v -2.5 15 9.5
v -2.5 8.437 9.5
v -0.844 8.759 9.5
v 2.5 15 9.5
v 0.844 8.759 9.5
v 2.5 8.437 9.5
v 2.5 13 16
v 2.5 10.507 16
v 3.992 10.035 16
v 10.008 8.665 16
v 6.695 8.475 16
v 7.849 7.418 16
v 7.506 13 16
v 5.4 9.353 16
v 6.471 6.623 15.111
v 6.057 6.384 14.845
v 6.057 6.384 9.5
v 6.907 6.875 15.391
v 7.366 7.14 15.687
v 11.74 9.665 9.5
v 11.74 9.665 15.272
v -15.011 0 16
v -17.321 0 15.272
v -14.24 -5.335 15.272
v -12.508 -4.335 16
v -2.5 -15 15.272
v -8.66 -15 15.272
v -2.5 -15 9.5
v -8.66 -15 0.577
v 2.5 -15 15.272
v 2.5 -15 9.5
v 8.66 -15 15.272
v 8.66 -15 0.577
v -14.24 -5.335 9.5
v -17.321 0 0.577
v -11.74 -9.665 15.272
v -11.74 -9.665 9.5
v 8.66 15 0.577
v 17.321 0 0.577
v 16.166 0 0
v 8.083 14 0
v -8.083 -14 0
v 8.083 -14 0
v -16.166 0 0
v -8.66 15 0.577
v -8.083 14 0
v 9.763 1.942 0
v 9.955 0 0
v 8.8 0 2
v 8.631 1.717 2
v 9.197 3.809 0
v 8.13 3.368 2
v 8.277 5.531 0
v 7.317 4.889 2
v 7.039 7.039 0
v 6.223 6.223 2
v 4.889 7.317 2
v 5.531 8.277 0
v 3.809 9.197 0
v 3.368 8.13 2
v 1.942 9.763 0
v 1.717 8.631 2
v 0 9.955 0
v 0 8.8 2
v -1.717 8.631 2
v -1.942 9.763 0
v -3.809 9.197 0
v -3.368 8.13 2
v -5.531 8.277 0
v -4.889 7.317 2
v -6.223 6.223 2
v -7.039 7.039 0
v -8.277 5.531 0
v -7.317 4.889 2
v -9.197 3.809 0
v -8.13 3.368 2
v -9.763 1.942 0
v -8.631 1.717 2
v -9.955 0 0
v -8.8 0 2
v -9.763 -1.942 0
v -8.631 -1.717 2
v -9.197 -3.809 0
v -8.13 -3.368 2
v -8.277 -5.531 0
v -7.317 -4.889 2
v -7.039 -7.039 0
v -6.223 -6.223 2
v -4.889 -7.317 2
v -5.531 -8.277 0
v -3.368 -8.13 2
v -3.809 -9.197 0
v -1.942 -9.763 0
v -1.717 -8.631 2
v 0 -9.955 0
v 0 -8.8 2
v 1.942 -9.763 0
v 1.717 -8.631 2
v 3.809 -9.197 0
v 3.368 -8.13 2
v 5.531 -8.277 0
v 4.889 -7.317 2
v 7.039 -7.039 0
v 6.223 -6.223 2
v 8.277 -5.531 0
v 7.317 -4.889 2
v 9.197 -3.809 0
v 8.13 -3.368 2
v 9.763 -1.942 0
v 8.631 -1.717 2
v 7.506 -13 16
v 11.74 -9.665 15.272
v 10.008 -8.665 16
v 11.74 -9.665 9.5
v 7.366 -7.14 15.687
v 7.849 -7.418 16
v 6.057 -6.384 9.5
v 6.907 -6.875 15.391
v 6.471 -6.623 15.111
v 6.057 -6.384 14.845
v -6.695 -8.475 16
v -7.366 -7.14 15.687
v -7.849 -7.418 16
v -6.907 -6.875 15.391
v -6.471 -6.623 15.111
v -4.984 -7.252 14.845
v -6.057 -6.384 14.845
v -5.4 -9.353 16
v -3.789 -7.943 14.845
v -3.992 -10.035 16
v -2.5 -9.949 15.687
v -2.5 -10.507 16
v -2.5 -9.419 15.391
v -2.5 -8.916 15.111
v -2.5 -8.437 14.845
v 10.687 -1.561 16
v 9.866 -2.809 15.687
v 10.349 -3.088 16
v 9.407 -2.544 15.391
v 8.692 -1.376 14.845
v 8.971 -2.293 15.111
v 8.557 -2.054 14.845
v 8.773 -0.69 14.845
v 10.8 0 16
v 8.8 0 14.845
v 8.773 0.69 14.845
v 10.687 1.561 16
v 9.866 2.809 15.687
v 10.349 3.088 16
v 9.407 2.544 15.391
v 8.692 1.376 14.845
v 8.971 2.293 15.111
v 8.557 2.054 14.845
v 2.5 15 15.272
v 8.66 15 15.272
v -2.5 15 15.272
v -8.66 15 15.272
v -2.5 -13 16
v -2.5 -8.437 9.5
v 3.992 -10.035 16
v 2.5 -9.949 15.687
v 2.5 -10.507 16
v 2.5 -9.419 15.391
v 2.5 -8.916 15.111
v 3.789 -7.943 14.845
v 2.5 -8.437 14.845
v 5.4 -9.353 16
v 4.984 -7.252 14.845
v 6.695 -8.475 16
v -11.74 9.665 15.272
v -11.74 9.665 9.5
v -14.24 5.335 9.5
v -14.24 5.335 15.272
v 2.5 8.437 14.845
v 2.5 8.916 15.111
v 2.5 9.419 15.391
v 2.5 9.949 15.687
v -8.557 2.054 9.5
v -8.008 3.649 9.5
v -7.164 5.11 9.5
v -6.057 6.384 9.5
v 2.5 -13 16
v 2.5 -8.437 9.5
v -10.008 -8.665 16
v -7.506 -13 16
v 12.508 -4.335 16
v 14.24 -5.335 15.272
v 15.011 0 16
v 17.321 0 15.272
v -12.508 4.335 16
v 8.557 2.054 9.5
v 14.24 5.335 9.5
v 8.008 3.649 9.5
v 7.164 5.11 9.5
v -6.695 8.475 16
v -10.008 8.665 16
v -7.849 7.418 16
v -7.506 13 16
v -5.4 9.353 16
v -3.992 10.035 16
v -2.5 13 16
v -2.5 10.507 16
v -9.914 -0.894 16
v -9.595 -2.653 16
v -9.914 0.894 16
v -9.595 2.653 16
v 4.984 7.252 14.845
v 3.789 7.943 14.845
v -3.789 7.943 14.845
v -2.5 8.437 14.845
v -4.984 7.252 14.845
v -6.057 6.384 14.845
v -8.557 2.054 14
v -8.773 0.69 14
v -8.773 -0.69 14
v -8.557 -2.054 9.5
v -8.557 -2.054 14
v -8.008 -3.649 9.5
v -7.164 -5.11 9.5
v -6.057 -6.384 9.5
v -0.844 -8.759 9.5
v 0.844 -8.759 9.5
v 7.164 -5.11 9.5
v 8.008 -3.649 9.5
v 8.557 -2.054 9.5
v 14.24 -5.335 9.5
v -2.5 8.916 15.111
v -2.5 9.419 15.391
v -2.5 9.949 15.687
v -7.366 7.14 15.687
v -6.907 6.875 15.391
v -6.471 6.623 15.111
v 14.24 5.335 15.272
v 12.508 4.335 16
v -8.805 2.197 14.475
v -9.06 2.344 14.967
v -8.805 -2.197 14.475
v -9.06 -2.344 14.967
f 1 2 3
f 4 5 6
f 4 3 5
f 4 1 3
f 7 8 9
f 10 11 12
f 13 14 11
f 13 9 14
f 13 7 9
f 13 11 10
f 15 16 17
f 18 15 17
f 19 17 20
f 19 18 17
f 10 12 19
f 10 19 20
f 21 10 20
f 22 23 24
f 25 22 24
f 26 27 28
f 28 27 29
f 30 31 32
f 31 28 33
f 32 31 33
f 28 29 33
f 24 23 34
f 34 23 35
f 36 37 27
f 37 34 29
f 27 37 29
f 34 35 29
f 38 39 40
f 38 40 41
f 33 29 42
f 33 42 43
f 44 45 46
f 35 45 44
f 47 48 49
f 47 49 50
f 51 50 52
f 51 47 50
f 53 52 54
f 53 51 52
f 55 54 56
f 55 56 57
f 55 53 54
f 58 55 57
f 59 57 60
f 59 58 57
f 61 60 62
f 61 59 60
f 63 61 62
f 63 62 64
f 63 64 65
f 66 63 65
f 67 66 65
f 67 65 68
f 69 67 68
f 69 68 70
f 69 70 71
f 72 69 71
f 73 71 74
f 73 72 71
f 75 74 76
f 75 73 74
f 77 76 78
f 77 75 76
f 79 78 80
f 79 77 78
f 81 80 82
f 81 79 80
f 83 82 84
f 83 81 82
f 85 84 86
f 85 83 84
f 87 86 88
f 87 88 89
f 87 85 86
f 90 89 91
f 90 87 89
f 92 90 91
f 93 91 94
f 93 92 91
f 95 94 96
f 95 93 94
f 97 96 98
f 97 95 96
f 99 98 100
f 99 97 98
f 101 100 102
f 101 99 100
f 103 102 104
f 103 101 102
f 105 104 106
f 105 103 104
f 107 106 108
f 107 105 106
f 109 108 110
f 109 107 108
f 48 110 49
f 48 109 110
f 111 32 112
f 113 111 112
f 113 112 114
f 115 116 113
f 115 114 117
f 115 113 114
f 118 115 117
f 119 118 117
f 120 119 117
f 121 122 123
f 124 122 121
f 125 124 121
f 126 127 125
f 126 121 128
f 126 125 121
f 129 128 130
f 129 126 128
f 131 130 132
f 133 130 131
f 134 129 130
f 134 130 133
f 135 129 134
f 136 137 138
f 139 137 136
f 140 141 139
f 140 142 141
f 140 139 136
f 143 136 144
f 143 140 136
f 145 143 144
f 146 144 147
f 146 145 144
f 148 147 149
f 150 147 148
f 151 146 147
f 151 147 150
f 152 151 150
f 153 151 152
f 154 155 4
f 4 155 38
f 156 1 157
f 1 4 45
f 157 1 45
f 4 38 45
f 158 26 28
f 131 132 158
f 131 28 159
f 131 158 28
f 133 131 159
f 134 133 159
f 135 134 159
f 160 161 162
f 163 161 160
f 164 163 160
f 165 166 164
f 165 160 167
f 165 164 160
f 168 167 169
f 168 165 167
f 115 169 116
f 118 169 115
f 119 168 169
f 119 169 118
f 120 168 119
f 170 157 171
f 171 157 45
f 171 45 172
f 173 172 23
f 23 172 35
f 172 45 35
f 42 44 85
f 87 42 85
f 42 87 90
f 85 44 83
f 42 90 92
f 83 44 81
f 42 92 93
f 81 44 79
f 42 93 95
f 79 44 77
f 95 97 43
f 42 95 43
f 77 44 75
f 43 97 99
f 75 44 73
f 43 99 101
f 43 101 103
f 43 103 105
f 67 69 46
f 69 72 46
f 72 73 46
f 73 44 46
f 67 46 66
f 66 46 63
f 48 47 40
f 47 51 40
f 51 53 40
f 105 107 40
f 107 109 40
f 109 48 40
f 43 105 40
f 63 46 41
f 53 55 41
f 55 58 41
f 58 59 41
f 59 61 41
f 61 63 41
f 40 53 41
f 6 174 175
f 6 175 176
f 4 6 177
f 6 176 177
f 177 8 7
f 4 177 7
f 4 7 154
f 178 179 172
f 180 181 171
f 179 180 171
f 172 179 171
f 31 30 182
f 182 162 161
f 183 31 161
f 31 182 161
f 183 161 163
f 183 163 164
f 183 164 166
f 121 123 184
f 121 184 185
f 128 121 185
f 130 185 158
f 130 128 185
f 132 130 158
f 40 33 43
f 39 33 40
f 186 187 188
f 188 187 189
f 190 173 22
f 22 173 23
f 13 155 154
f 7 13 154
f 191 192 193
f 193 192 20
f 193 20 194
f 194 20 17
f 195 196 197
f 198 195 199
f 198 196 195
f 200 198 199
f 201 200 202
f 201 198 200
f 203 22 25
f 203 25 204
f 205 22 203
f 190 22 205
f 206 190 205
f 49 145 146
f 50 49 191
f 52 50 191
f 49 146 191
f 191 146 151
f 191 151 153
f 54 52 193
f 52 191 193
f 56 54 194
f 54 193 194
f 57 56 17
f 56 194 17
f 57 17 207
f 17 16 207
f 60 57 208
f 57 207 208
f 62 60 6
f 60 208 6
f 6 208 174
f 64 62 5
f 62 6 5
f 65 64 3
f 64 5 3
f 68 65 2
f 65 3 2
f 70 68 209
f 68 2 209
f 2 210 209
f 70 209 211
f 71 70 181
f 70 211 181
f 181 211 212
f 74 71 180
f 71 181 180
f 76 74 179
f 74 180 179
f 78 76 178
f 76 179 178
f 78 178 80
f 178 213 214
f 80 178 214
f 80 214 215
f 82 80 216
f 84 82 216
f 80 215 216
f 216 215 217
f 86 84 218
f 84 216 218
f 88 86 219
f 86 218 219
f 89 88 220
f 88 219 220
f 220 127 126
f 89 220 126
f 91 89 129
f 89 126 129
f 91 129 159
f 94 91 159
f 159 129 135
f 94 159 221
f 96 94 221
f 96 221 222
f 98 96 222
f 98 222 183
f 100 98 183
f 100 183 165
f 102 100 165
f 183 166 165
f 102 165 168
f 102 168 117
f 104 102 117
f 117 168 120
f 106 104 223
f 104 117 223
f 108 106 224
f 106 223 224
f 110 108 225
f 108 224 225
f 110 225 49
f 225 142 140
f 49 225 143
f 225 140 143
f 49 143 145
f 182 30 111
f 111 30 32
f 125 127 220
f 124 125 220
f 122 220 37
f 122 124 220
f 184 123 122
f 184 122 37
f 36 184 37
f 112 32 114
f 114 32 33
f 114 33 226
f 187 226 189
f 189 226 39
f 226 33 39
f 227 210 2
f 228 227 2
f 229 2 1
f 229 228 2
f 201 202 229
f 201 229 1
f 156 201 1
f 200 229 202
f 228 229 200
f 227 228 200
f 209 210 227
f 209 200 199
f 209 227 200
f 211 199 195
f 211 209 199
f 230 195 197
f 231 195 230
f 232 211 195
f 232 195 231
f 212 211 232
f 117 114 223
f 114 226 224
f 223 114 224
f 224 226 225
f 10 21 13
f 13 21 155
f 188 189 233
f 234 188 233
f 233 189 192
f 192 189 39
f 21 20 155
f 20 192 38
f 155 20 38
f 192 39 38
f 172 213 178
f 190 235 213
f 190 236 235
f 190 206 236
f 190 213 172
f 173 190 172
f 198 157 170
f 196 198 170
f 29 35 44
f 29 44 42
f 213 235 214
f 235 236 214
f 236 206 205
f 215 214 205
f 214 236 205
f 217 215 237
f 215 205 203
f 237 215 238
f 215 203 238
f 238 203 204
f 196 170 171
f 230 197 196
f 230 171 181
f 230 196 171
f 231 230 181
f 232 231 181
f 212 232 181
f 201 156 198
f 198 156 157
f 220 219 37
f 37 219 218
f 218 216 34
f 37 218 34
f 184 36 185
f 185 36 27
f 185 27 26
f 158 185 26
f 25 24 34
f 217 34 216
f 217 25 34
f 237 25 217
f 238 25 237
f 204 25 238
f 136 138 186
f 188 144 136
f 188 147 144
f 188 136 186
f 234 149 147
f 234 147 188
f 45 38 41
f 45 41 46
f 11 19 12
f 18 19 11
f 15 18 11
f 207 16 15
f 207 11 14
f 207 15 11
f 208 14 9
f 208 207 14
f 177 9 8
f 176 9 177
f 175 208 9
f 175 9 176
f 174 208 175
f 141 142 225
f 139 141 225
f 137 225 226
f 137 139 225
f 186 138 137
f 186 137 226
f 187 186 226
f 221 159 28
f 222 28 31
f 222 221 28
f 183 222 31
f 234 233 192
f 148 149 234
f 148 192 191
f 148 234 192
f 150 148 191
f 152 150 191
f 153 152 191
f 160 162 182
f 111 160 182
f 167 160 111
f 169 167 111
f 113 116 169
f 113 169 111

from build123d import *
from OCP.BRepFilletAPI import BRepFilletAPI_MakeChamfer

# Parameters (mm, degrees)
RESSALTO_EXTRUS_O1_DEPTH = 16
CHANFRO1_SIZE            = 2
CHANFRO1_SIZE2           = 0.727940469
ESBO_O2_R                = 8.8
CORTE_EXTRUS_O1_DEPTH    = 16
ESBO_O3_W                = 5
ESBO_O3_H                = 10
CORTE_EXTRUS_O2_DEPTH    = 6.5
CHANFRO2_SIZE            = 2
CHANFRO2_SIZE2           = 1.154700538
CHANFRO3_SIZE            = 2
CHANFRO3_SIZE2           = 1.154700538
CHANFRO5_SIZE            = 1
CHANFRO5_SIZE2           = 0.577350269


with BuildPart() as part:
    # Esboço1 → Ressalto-extrusão1 (new body)
    with BuildSketch(Plane.XY):
        Polygon((17.320508076, 0), (8.660254038, 15), (-8.660254038, 15), (-17.320508076, 0), (-8.660254038, -15), (8.660254038, -15), align=None)
    extrude(amount=RESSALTO_EXTRUS_O1_DEPTH)

    # Chanfro1
    chanfro1_edges = [part.edges().sort_by_distance(p)[0] for p in [
        (0, 15, 16),
        (-12.990381057, 7.5, 16),
        (-12.990381057, -7.5, 16),
        (0, -15, 16),
        (12.990381057, -7.5, 16),
        (12.990381057, 7.5, 16),
    ]]
    chanfro1_side = [part.faces().sort_by_distance(p)[0] for p in [
        (0, 0, 16),
    ]]
    chamfer(chanfro1_edges, length=CHANFRO1_SIZE, length2=CHANFRO1_SIZE2, reference=chanfro1_side[0])

    # Esboço2 → Corte-extrusão1 (cut)
    with BuildSketch(Plane.XY.offset(16)):
        Circle(ESBO_O2_R)
    extrude(amount=-CORTE_EXTRUS_O1_DEPTH, mode=Mode.SUBTRACT)

    # Esboço3 → Corte-extrusão2 (cut)
    with BuildSketch(Plane.XY.offset(16)):
        Polygon((13.353868008, 10.596610635), (15.853868008, 6.266483616), (7.19361397, 1.266483616), (4.69361397, 5.596610635), align=None)
        with Locations((0, 11.863094251)):
            Rectangle(ESBO_O3_W, ESBO_O3_H)
        Polygon((15.853868008, -6.266483616), (13.353868008, -10.596610635), (4.69361397, -5.596610635), (7.19361397, -1.266483616), align=None)
        with Locations((0, -11.863094251)):
            Rectangle(ESBO_O3_W, ESBO_O3_H)
        Polygon((-13.353868008, -10.596610635), (-15.853868008, -6.266483616), (-7.19361397, -1.266483616), (-4.69361397, -5.596610635), align=None)
        Polygon((-15.853868008, 6.266483616), (-13.353868008, 10.596610635), (-4.69361397, 5.596610635), (-7.19361397, 1.266483616), align=None)
    extrude(amount=-CORTE_EXTRUS_O2_DEPTH, mode=Mode.SUBTRACT)

    # Chanfro2: one chamfer whose edges measure the first distance from different faces: ONE call of the kernel's chamfer builder (chamfer() names one face for all edges)
    chanfro2_edges_1 = [part.edges().sort_by_distance(p)[0] for p in [
        (4.4, -7.621023553, 16),
    ]]
    chanfro2_side_1 = [part.faces().sort_by_distance(p)[0] for p in [
        (5.798091402, -10.042588894, 16),
    ]]
    chanfro2_edges_2 = [part.edges().sort_by_distance(p)[0] for p in [
        (-4.4, -7.621023553, 16),
    ]]
    chanfro2_side_2 = [part.faces().sort_by_distance(p)[0] for p in [
        (-5.798091402, -10.042588894, 16),
    ]]
    chanfro2_edges_3 = [part.edges().sort_by_distance(p)[0] for p in [
        (-8.8, 0, 16),
    ]]
    chanfro2_side_3 = [part.faces().sort_by_distance(p)[0] for p in [
        (-8.8, 0, 8),
    ]]
    chanfro2_edges_4 = [part.edges().sort_by_distance(p)[0] for p in [
        (-4.4, 7.621023553, 16),
    ]]
    chanfro2_side_4 = [part.faces().sort_by_distance(p)[0] for p in [
        (-5.798091402, 10.042588894, 16),
    ]]
    chanfro2_edges_5 = [part.edges().sort_by_distance(p)[0] for p in [
        (4.4, 7.621023553, 16),
    ]]
    chanfro2_side_5 = [part.faces().sort_by_distance(p)[0] for p in [
        (5.798091402, 10.042588894, 16),
    ]]
    chanfro2_edges_6 = [part.edges().sort_by_distance(p)[0] for p in [
        (8.739043173, 1.033984733, 16),
    ]]
    chanfro2_side_6 = [part.faces().sort_by_distance(p)[0] for p in [
        (11.596182803, 0, 16),
    ]]
    chanfro2 = BRepFilletAPI_MakeChamfer(part.part.solid().wrapped)
    for e in chanfro2_edges_1:
        chanfro2.Add(CHANFRO2_SIZE, CHANFRO2_SIZE2, e.wrapped, chanfro2_side_1[0].wrapped)  # the first distance lies on this face
    for e in chanfro2_edges_2:
        chanfro2.Add(CHANFRO2_SIZE, CHANFRO2_SIZE2, e.wrapped, chanfro2_side_2[0].wrapped)  # the first distance lies on this face
    for e in chanfro2_edges_3:
        chanfro2.Add(CHANFRO2_SIZE, CHANFRO2_SIZE2, e.wrapped, chanfro2_side_3[0].wrapped)  # the first distance lies on this face
    for e in chanfro2_edges_4:
        chanfro2.Add(CHANFRO2_SIZE, CHANFRO2_SIZE2, e.wrapped, chanfro2_side_4[0].wrapped)  # the first distance lies on this face
    for e in chanfro2_edges_5:
        chanfro2.Add(CHANFRO2_SIZE, CHANFRO2_SIZE2, e.wrapped, chanfro2_side_5[0].wrapped)  # the first distance lies on this face
    for e in chanfro2_edges_6:
        chanfro2.Add(CHANFRO2_SIZE, CHANFRO2_SIZE2, e.wrapped, chanfro2_side_6[0].wrapped)  # the first distance lies on this face
    add(Compound.cast(chanfro2.Shape()), mode=Mode.REPLACE)

    # Chanfro3
    chanfro3_edges = [part.edges().sort_by_distance(p)[0] for p in [
        (-8.8, 0, 0),
    ]]
    chanfro3_side = [part.faces().sort_by_distance(p)[0] for p in [
        (-8.8, 0, 7.422649731),
    ]]
    chamfer(chanfro3_edges, length=CHANFRO3_SIZE, length2=CHANFRO3_SIZE2, reference=chanfro3_side[0])

    # Chanfro5
    chanfro5_edges = [part.edges().sort_by_distance(p)[0] for p in [
        (0, -15, 0),
        (-12.990381057, -7.5, 0),
        (-12.990381057, 7.5, 0),
        (0, 15, 0),
        (12.990381057, 7.5, 0),
        (12.990381057, -7.5, 0),
    ]]
    chanfro5_side = [part.faces().sort_by_distance(p)[0] for p in [
        (-10.412958108, 0, 0),
    ]]
    chamfer(chanfro5_edges, length=CHANFRO5_SIZE, length2=CHANFRO5_SIZE2, reference=chanfro5_side[0])


solid = part.part
